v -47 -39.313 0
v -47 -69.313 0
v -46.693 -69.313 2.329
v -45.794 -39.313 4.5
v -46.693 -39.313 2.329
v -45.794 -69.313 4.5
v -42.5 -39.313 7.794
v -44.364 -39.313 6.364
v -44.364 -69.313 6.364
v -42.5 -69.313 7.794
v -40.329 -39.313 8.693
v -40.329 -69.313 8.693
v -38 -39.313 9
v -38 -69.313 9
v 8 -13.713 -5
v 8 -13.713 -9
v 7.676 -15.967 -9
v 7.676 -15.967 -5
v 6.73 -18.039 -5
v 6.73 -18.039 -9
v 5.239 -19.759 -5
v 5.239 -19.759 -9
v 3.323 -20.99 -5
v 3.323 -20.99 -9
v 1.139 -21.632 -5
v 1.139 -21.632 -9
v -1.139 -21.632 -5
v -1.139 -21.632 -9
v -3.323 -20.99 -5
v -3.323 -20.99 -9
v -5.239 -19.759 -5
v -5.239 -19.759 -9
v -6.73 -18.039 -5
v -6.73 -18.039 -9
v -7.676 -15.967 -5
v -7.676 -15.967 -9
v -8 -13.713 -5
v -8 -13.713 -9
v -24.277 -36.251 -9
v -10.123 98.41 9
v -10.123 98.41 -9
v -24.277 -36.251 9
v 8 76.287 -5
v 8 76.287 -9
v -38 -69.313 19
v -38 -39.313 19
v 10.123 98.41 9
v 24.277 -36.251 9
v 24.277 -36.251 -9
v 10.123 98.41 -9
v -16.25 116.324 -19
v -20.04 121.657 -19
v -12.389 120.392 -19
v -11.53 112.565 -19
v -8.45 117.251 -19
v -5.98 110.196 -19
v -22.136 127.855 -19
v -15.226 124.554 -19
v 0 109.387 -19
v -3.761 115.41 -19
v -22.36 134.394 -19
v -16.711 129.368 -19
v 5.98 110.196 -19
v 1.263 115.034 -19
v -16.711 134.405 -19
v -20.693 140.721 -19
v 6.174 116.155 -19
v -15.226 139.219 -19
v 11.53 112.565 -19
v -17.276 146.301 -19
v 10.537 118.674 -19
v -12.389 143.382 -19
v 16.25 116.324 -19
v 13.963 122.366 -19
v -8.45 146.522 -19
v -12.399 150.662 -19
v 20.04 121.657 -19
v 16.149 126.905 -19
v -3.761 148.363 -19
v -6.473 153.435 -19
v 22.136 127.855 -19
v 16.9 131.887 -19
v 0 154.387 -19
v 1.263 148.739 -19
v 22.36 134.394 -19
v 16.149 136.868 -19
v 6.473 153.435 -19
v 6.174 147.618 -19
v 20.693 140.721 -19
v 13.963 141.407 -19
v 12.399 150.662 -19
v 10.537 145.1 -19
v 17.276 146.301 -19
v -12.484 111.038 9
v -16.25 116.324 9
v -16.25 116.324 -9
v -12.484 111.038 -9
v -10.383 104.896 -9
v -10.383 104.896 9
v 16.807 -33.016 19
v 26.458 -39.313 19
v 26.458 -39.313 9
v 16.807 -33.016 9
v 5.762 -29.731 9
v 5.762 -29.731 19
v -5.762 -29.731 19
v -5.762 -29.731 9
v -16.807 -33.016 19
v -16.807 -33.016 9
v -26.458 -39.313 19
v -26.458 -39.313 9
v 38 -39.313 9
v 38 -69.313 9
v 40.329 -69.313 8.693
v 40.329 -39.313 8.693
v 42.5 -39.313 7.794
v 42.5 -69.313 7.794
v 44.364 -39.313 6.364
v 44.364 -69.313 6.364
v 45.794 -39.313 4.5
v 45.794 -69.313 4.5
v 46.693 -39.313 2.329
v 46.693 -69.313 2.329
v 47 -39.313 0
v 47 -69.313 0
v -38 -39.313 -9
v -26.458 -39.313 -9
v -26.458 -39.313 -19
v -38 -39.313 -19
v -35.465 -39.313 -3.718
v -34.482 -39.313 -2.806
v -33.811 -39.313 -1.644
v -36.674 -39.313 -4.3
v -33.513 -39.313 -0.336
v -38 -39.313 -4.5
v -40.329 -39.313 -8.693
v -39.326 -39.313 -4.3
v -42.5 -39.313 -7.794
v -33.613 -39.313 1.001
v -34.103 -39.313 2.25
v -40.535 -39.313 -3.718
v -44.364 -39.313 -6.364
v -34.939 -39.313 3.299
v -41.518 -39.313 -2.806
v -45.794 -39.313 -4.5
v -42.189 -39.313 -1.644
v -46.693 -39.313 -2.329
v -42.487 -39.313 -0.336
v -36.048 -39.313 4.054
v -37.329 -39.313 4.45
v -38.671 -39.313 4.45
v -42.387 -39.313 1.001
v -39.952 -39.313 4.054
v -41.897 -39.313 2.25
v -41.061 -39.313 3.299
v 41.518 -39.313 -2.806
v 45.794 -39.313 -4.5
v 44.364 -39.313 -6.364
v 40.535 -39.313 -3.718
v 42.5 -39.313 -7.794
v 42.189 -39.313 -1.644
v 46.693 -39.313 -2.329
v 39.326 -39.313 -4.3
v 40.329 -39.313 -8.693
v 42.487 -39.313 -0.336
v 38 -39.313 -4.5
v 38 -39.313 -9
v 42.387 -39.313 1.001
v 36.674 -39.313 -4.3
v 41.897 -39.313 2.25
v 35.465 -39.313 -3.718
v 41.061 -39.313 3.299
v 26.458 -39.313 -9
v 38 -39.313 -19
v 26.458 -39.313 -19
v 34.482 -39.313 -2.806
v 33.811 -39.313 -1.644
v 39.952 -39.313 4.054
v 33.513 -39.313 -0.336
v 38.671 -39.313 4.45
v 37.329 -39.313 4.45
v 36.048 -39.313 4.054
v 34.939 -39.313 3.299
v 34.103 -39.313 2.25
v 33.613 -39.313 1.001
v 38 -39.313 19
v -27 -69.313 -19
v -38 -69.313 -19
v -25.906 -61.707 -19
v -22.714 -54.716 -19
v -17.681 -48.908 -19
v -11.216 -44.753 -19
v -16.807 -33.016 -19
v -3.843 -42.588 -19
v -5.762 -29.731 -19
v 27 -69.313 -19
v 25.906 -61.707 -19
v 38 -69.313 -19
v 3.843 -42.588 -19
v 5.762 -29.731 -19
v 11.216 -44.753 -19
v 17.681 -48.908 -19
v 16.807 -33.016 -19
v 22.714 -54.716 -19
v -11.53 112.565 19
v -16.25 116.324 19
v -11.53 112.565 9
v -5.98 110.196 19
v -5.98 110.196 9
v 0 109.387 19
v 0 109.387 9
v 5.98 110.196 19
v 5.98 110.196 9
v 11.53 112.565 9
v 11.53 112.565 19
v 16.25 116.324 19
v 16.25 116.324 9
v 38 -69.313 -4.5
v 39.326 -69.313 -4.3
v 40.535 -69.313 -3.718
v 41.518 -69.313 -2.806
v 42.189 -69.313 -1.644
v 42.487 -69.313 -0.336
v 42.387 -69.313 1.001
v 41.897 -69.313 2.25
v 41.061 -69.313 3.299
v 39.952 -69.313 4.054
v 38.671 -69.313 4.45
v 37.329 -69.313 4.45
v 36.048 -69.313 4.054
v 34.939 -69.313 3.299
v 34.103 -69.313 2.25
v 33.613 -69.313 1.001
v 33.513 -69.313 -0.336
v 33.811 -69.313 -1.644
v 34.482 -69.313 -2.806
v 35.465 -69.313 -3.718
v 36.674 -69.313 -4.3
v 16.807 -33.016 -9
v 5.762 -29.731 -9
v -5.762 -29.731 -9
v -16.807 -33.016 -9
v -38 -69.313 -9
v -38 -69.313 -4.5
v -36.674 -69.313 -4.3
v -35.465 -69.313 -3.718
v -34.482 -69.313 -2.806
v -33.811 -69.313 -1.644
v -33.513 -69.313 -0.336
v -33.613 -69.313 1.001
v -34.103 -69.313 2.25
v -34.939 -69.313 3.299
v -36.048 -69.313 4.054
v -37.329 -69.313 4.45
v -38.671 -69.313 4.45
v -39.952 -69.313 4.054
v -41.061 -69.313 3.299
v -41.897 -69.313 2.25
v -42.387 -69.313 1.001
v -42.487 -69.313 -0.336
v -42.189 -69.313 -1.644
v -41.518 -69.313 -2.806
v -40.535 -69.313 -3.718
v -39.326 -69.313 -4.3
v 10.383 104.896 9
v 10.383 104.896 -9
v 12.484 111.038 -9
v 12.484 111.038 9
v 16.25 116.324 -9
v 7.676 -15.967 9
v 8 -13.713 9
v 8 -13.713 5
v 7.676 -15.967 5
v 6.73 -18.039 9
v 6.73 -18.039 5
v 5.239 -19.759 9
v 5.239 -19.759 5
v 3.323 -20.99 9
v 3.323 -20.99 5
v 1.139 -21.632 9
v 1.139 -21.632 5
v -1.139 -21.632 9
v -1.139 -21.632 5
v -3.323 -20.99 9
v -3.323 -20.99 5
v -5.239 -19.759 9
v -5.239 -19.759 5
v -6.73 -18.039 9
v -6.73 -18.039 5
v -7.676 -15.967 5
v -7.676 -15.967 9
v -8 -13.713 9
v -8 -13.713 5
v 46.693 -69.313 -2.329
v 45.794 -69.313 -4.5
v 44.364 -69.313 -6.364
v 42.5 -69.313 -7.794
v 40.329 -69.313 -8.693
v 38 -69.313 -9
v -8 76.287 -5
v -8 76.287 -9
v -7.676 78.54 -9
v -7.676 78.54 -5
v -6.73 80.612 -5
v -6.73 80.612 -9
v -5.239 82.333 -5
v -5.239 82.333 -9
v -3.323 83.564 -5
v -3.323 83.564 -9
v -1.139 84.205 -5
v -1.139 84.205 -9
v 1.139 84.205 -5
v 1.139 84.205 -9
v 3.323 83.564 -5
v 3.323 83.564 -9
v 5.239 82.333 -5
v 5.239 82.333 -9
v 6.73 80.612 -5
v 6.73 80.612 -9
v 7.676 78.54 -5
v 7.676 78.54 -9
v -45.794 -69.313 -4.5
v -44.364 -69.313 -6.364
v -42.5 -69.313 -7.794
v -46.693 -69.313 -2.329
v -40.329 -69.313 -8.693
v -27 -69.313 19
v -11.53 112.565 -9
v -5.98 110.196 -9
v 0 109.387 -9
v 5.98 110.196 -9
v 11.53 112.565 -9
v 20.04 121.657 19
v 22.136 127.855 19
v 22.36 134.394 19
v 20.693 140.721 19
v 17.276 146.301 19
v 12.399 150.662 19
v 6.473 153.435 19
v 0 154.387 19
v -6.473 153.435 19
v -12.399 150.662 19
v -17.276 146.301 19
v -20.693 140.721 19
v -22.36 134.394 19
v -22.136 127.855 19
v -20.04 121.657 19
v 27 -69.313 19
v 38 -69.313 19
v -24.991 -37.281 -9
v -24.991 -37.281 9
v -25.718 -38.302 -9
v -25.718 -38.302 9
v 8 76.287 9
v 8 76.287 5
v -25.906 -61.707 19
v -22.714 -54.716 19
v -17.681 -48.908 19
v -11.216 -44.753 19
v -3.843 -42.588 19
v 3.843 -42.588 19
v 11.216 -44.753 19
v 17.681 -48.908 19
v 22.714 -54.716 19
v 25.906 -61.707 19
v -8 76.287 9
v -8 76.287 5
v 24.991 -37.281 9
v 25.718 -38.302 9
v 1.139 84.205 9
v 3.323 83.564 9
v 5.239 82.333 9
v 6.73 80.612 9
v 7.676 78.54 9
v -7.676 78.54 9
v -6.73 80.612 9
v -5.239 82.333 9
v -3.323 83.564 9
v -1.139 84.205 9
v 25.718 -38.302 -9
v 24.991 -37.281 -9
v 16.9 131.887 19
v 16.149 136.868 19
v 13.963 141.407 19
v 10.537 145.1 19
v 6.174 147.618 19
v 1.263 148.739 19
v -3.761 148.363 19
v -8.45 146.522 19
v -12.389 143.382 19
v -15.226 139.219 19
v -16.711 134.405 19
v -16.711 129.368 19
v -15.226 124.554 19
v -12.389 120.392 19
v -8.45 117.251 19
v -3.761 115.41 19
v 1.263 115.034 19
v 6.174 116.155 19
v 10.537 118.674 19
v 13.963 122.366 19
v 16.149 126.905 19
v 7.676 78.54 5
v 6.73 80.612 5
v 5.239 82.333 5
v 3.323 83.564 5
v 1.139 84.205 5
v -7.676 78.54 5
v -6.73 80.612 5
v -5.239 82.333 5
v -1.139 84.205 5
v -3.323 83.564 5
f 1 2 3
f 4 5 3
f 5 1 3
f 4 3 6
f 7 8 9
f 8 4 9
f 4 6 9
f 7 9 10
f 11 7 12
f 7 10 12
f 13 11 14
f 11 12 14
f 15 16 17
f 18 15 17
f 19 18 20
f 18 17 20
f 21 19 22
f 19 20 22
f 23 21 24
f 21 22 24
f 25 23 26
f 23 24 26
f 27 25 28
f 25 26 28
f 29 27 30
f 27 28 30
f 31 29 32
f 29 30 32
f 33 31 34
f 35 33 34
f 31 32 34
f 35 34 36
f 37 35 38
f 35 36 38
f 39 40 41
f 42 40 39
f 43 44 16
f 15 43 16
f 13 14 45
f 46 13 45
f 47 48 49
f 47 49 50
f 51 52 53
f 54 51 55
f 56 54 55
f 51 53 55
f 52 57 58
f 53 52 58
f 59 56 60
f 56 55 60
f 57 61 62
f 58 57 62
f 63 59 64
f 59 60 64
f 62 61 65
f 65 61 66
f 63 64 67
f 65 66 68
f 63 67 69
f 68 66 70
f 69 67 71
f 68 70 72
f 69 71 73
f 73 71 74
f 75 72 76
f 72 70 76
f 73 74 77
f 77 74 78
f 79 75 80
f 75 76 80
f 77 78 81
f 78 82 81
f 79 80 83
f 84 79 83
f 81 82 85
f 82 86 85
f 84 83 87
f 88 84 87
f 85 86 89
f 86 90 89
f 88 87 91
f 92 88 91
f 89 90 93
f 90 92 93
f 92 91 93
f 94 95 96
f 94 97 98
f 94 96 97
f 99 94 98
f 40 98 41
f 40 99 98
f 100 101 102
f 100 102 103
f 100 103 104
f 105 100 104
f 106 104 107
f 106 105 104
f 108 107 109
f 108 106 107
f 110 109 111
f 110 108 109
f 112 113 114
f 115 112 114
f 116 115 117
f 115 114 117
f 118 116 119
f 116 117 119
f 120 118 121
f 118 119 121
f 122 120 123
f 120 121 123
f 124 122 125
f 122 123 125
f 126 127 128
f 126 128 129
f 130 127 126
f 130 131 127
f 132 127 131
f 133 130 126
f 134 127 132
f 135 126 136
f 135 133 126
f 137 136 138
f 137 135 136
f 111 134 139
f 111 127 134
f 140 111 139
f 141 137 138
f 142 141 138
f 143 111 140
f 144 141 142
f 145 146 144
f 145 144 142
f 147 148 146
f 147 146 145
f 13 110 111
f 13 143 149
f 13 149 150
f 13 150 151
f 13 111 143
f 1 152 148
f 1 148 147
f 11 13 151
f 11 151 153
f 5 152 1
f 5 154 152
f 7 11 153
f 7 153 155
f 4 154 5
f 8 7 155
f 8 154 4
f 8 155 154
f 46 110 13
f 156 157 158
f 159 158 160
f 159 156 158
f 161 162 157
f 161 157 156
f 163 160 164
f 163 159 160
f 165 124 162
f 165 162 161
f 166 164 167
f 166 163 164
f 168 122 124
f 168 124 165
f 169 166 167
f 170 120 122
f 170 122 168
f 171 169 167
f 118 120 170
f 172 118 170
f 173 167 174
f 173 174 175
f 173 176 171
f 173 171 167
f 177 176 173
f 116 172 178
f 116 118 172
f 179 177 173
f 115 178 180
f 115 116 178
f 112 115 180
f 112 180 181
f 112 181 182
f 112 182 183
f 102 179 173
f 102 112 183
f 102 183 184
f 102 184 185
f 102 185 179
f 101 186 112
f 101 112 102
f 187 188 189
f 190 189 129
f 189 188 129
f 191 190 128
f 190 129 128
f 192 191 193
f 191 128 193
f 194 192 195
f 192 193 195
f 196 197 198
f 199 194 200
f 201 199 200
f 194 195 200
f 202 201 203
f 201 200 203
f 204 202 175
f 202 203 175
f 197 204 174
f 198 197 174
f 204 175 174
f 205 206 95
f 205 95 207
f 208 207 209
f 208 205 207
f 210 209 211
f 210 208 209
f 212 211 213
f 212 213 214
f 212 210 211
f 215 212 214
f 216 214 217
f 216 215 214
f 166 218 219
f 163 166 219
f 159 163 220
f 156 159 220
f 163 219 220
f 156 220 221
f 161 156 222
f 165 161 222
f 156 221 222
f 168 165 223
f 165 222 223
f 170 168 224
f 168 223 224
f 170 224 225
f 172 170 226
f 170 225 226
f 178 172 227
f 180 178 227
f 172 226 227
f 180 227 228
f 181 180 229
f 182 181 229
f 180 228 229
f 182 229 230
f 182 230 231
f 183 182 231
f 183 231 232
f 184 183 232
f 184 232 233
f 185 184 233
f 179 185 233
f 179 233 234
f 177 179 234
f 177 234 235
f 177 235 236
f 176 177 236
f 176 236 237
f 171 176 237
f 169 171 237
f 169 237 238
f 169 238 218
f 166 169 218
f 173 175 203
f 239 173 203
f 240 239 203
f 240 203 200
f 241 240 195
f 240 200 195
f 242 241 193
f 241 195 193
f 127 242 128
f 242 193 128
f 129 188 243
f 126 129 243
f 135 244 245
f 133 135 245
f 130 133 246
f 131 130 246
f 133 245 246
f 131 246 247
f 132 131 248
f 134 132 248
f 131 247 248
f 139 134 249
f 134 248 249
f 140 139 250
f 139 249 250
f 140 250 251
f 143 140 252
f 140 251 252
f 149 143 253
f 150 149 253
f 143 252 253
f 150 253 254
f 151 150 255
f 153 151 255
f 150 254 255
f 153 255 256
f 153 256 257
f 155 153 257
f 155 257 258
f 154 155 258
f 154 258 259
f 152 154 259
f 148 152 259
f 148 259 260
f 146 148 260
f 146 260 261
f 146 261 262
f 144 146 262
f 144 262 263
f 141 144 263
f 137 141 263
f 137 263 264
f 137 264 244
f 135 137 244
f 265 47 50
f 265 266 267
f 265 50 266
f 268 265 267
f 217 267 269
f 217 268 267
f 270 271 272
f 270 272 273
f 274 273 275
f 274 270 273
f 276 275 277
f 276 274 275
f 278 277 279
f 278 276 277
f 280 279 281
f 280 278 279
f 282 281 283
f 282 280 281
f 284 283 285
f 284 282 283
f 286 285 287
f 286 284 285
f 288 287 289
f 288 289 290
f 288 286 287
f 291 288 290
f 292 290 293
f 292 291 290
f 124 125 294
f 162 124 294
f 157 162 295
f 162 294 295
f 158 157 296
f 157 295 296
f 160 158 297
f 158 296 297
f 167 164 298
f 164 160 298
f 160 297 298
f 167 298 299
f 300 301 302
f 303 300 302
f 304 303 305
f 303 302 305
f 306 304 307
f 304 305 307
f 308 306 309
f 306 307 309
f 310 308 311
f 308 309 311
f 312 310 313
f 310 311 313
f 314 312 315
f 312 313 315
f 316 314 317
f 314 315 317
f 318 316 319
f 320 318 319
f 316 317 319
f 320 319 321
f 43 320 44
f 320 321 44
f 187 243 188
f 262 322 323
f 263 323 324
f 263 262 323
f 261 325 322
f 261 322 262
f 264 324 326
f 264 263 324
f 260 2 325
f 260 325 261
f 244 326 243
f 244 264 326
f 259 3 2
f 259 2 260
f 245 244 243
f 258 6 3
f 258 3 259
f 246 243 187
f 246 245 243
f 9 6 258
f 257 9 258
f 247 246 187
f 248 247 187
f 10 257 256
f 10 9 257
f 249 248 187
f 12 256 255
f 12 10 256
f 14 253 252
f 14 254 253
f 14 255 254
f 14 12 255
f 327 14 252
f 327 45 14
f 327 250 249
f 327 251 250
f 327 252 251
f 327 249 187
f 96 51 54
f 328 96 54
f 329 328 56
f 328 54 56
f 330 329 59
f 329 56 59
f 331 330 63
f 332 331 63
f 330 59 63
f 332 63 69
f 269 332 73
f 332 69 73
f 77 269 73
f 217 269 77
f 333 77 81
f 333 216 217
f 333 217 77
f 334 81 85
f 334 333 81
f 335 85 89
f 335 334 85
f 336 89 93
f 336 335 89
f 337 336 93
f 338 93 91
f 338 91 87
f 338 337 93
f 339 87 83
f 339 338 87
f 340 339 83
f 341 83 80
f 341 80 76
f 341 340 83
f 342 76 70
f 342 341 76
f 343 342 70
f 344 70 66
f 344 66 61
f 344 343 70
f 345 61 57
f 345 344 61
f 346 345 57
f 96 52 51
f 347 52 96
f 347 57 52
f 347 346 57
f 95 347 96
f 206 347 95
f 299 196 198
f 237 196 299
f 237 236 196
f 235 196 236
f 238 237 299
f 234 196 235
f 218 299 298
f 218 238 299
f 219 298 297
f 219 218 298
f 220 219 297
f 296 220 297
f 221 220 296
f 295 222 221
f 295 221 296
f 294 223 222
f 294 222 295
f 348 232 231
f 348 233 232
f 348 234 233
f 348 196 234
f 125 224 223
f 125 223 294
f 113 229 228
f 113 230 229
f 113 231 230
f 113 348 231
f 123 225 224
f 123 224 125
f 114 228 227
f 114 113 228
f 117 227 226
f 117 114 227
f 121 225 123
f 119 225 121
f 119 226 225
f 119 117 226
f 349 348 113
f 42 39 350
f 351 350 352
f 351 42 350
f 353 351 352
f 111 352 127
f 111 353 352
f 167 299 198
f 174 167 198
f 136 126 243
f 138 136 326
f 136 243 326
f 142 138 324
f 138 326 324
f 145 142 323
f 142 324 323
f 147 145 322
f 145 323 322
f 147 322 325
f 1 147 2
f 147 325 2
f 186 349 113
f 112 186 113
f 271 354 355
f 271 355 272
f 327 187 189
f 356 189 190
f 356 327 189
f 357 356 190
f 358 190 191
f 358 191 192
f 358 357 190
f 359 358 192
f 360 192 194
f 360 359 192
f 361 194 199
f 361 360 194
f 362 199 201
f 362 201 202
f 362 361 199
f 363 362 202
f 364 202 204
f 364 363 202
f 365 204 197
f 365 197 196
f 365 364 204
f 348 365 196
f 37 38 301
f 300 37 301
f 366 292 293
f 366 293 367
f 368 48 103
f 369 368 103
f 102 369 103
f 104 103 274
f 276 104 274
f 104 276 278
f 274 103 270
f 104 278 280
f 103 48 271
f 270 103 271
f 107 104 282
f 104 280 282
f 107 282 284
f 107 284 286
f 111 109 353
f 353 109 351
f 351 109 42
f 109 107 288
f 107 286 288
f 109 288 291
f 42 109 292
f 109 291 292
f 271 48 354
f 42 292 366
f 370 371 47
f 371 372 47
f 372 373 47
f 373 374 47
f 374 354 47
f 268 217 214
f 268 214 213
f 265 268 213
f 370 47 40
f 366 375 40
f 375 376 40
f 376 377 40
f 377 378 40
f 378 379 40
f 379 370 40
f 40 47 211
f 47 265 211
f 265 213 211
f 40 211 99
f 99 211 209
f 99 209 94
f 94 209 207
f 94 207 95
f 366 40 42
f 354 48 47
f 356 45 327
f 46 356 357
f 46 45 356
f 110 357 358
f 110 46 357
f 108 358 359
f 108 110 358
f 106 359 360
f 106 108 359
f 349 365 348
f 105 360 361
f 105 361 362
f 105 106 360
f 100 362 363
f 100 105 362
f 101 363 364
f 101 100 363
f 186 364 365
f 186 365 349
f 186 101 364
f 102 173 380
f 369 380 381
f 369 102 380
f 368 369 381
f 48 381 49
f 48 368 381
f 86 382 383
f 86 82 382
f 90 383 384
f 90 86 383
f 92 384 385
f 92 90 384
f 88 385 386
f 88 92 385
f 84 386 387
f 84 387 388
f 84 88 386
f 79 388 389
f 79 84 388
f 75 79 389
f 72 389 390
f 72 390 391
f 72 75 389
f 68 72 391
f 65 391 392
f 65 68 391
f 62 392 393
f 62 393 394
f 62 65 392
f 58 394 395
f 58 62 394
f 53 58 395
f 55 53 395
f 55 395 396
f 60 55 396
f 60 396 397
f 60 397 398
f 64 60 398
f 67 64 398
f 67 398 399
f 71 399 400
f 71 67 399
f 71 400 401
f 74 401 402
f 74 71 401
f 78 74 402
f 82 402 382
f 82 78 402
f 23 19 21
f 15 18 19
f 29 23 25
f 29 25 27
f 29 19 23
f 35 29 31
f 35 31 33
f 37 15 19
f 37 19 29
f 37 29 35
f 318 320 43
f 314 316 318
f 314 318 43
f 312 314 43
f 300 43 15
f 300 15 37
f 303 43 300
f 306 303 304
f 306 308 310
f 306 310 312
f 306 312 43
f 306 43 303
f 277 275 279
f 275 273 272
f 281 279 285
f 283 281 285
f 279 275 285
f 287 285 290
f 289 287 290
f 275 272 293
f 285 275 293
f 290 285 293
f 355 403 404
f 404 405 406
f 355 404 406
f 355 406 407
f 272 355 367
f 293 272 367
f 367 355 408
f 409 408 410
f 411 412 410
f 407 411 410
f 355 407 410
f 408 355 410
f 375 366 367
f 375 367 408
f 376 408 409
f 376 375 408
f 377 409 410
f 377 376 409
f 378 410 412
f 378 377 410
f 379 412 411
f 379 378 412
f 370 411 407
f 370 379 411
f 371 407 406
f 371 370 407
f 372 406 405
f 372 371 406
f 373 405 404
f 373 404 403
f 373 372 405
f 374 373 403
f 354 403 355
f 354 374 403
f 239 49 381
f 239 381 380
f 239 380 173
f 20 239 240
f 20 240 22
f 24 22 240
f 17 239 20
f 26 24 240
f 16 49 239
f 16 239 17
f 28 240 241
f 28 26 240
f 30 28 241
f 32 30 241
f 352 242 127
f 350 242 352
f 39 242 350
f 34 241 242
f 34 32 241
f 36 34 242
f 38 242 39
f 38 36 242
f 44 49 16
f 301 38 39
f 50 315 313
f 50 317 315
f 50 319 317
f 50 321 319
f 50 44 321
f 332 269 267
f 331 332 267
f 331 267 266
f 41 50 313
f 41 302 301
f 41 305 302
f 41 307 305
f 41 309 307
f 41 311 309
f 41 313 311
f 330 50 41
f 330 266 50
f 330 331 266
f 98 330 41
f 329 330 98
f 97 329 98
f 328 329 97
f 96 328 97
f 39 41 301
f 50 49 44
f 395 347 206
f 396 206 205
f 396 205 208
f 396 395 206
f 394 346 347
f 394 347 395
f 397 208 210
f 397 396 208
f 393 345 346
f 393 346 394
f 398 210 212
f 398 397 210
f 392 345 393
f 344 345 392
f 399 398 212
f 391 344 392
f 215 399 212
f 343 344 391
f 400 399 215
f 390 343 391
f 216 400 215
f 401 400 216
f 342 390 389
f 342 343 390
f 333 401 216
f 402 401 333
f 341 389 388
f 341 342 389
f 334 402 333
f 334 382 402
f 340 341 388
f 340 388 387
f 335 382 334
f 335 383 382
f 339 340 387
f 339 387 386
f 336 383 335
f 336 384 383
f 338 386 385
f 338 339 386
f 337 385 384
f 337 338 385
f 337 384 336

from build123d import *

# Parameters (mm, degrees)
SKETCH1_R           = 16.9
BOSS_EXTRUDE1_DEPTH = 19
SKETCH2_R           = 4.5
CUT_EXTRUDE2_DEPTH  = 38
CUT_EXTRUDE3_DEPTH  = 10
CUT_EXTRUDE4_DEPTH  = 4


with BuildPart() as part:
    # Sketch1 → Boss-Extrude1 (new, symmetric)
    with BuildSketch(Plane.XY):
        with BuildLine():
            Line((47, -69.313412318), (47, -39.313412318))
            Line((47, -39.313412318), (26.457513111, -39.313412318))
            ThreePointArc((26.457513111, -39.313412318), (25.35270378, -37.792402472), (24.27668208, -36.250892852))
            Line((24.27668208, -36.250892852), (10.123257354, 98.409948263))
            ThreePointArc((10.123257354, 98.409948263), (11.210647408, 108.042873382), (16.25, 116.324213184))
            ThreePointArc((16.25, 116.324213184), (0, 154.386587682), (-16.25, 116.324213184))
            ThreePointArc((-16.25, 116.324213184), (-11.210647408, 108.042873382), (-10.123257354, 98.409948263))
            Line((-10.123257354, 98.409948263), (-24.27668208, -36.250892852))
            ThreePointArc((-24.27668208, -36.250892852), (-25.35270378, -37.792402472), (-26.457513111, -39.313412318))
            Line((-26.457513111, -39.313412318), (-47, -39.313412318))
            Line((-47, -39.313412318), (-47, -69.313412318))
            Line((-47, -69.313412318), (-40, -69.313412318))
            Line((-40, -69.313412318), (-27, -69.313412318))
            ThreePointArc((-27, -69.313412318), (0, -42.313412318), (27, -69.313412318))
            Line((27, -69.313412318), (40, -69.313412318))
            Line((40, -69.313412318), (47, -69.313412318))
        make_face()
        with Locations((0, 131.886587682)):
            Circle(SKETCH1_R, mode=Mode.SUBTRACT)
    extrude(amount=BOSS_EXTRUDE1_DEPTH, both=True)

    # Sketch2 → Cut-Extrude2 (cut)
    with BuildSketch(Plane.XZ.offset(69.313412318)):
        with BuildLine():
            Line((-38, 19), (-47, 19))
            Line((-47, 19), (-47, 6.6e-08))
            ThreePointArc((-47, 6.6e-08), (-44.363961007, 6.363961054), (-38, 9))
            Line((-38, 9), (-38, 19))
        make_face()
        with BuildLine():
            ThreePointArc((-38, -9), (-44.363961054, -6.363961007), (-47, 6.6e-08))
            Line((-47, 6.6e-08), (-47, -19))
            Line((-47, -19), (-38, -19))
            Line((-38, -19), (-38, -9))
        make_face()
        with BuildLine():
            Line((47, 19), (38, 19))
            Line((38, 19), (38, 9))
            ThreePointArc((38, 9), (44.363961031, 6.363961031), (47, 0))
            Line((47, 0), (47, 19))
        make_face()
        with BuildLine():
            Line((38, -9), (38, -19))
            Line((38, -19), (47, -19))
            Line((47, -19), (47, 0))
            ThreePointArc((47, 0), (44.363961031, -6.363961031), (38, -9))
        make_face()
        with Locations(Location((38, 0, 0), (0, 0, 270))):
            Circle(SKETCH2_R)
        with Locations(Location((-38, 0, 0), (0, 0, 270))):
            Circle(SKETCH2_R)
    extrude(amount=-CUT_EXTRUDE2_DEPTH, mode=Mode.SUBTRACT)

    # Sketch3 → Cut-Extrude3 (cut)
    with BuildSketch(Plane.XY.offset(19)):
        with BuildLine():
            Line((-26.457513111, -39.313412318), (-22.5, 131.886587682))
            ThreePointArc((-22.5, 131.886587682), (0, 109.386587682), (22.5, 131.886587682))
            Line((22.5, 131.886587682), (26.457513111, -39.313412318))
            ThreePointArc((26.457513111, -39.313412318), (0, -29.313412318), (-26.457513111, -39.313412318))
        make_face()
    cut_extrude3 = extrude(amount=-CUT_EXTRUDE3_DEPTH, mode=Mode.SUBTRACT)

    # Mirror1: Cut-Extrude3 across plane
    add(cut_extrude3.mirror(Plane.XY), mode=Mode.SUBTRACT)

    # Sketch4 → Cut-Extrude4 (cut)
    with BuildSketch(Plane.XY.offset(9)):
        with BuildLine():
            Line((8, 76.286587682), (8, -13.713412318))
            ThreePointArc((8, -13.713412318), (0, -21.713412318), (-8, -13.713412318))
            Line((-8, -13.713412318), (-8, 76.286587682))
            ThreePointArc((-8, 76.286587682), (0, 84.286587682), (8, 76.286587682))
        make_face()
    cut_extrude4 = extrude(amount=-CUT_EXTRUDE4_DEPTH, mode=Mode.SUBTRACT)

    # Mirror2: Cut-Extrude4 across plane
    add(cut_extrude4.mirror(Plane.XY), mode=Mode.SUBTRACT)


solid = part.part
